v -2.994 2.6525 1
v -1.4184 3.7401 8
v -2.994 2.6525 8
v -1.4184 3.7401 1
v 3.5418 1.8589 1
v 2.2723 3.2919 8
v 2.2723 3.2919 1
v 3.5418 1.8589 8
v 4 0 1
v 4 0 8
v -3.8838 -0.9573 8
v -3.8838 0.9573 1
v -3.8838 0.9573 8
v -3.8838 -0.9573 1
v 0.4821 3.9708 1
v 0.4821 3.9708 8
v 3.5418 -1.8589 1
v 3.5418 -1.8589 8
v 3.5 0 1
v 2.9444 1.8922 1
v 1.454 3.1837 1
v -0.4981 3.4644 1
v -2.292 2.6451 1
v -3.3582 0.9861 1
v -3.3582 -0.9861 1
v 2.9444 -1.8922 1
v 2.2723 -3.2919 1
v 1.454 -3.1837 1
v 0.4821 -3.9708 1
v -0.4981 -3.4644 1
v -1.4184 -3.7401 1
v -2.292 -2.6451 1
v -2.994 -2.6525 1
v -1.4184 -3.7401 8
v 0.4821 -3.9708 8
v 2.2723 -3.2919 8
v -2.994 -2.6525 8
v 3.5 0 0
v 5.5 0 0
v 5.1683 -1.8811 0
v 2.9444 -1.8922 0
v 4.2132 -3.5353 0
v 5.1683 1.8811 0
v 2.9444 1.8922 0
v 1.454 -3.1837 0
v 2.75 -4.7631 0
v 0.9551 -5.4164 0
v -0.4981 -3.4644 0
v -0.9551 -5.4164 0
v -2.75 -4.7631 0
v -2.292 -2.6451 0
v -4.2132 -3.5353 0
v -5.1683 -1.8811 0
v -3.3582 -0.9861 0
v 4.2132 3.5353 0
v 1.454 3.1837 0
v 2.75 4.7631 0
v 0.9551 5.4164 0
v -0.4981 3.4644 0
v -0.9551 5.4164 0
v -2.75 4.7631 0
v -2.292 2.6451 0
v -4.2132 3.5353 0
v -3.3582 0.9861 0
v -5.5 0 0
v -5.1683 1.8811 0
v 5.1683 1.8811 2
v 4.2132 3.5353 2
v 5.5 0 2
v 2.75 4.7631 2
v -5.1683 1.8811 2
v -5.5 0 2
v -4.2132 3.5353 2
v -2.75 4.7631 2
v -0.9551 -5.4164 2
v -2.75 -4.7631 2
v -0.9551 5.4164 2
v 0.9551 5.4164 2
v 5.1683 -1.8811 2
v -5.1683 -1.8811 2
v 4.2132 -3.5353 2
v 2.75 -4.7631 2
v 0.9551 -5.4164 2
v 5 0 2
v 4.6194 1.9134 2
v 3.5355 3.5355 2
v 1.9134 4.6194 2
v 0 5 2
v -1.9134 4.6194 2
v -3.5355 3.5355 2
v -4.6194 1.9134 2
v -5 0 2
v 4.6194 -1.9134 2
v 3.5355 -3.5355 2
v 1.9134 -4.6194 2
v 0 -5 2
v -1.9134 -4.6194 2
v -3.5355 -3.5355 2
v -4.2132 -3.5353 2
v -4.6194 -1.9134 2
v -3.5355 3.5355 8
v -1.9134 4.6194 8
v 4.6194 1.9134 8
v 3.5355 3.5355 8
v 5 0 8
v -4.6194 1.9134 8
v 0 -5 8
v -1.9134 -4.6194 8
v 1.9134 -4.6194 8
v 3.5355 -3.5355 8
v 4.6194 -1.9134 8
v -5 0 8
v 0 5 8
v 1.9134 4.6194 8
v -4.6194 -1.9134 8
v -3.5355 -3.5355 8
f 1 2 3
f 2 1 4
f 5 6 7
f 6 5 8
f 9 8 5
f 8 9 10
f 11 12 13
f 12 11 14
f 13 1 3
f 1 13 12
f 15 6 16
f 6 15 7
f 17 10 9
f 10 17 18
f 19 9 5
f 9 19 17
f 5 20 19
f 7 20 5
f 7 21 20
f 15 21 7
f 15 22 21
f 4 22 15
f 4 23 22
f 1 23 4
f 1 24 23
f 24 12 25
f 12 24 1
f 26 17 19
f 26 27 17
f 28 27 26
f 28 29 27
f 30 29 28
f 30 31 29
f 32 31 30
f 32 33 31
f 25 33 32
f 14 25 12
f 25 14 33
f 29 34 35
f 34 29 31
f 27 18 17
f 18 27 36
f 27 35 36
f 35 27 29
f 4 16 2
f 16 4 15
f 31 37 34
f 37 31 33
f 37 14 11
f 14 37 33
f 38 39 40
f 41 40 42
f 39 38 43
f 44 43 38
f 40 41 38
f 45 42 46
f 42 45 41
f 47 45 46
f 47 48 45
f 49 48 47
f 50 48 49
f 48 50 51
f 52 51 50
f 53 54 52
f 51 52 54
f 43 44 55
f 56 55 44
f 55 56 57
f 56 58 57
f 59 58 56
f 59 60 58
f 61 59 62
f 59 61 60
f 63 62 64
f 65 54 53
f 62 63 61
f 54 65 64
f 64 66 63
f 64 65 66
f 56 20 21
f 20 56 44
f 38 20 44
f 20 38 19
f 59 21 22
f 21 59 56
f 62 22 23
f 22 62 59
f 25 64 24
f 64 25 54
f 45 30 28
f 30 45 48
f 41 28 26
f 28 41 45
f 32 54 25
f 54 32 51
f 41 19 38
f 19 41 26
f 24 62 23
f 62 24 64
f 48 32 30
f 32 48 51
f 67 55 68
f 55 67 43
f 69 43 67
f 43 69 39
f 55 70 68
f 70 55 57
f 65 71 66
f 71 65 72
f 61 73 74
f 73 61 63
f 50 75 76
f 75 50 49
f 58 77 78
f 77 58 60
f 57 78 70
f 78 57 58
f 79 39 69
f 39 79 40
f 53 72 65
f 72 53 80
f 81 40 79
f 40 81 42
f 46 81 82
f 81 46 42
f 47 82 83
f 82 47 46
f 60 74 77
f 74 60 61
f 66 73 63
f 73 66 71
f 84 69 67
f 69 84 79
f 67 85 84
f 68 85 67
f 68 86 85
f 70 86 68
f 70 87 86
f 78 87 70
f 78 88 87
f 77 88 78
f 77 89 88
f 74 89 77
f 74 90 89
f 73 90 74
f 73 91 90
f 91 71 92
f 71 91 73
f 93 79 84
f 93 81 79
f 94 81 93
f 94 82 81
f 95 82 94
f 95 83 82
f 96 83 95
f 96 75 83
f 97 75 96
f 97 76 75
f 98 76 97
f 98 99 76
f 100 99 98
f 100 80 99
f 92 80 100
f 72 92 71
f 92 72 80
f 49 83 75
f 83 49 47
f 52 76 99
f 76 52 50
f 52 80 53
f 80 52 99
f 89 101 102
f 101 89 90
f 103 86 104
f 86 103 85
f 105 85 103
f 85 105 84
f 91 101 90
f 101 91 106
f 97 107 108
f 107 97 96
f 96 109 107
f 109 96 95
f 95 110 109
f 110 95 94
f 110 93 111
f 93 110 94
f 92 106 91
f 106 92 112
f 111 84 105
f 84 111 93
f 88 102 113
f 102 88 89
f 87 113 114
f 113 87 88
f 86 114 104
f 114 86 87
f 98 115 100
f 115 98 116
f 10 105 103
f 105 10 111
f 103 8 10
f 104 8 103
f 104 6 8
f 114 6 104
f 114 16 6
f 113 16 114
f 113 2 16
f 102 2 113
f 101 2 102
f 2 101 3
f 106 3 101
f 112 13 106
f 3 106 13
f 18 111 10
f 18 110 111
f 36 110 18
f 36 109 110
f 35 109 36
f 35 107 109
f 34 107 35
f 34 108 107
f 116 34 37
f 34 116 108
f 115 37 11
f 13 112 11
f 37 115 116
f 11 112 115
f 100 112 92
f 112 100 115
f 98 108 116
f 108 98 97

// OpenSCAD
module hollowCylinder(outerD, innerD, h) {
	difference () {
		cylinder(d=outerD, h=h);
		cylinder(d=innerD, h=h);
	}
}



hollowCylinder(8,7,1);
hollowCylinder(11,8,2);
hollowCylinder(10,8,8);
